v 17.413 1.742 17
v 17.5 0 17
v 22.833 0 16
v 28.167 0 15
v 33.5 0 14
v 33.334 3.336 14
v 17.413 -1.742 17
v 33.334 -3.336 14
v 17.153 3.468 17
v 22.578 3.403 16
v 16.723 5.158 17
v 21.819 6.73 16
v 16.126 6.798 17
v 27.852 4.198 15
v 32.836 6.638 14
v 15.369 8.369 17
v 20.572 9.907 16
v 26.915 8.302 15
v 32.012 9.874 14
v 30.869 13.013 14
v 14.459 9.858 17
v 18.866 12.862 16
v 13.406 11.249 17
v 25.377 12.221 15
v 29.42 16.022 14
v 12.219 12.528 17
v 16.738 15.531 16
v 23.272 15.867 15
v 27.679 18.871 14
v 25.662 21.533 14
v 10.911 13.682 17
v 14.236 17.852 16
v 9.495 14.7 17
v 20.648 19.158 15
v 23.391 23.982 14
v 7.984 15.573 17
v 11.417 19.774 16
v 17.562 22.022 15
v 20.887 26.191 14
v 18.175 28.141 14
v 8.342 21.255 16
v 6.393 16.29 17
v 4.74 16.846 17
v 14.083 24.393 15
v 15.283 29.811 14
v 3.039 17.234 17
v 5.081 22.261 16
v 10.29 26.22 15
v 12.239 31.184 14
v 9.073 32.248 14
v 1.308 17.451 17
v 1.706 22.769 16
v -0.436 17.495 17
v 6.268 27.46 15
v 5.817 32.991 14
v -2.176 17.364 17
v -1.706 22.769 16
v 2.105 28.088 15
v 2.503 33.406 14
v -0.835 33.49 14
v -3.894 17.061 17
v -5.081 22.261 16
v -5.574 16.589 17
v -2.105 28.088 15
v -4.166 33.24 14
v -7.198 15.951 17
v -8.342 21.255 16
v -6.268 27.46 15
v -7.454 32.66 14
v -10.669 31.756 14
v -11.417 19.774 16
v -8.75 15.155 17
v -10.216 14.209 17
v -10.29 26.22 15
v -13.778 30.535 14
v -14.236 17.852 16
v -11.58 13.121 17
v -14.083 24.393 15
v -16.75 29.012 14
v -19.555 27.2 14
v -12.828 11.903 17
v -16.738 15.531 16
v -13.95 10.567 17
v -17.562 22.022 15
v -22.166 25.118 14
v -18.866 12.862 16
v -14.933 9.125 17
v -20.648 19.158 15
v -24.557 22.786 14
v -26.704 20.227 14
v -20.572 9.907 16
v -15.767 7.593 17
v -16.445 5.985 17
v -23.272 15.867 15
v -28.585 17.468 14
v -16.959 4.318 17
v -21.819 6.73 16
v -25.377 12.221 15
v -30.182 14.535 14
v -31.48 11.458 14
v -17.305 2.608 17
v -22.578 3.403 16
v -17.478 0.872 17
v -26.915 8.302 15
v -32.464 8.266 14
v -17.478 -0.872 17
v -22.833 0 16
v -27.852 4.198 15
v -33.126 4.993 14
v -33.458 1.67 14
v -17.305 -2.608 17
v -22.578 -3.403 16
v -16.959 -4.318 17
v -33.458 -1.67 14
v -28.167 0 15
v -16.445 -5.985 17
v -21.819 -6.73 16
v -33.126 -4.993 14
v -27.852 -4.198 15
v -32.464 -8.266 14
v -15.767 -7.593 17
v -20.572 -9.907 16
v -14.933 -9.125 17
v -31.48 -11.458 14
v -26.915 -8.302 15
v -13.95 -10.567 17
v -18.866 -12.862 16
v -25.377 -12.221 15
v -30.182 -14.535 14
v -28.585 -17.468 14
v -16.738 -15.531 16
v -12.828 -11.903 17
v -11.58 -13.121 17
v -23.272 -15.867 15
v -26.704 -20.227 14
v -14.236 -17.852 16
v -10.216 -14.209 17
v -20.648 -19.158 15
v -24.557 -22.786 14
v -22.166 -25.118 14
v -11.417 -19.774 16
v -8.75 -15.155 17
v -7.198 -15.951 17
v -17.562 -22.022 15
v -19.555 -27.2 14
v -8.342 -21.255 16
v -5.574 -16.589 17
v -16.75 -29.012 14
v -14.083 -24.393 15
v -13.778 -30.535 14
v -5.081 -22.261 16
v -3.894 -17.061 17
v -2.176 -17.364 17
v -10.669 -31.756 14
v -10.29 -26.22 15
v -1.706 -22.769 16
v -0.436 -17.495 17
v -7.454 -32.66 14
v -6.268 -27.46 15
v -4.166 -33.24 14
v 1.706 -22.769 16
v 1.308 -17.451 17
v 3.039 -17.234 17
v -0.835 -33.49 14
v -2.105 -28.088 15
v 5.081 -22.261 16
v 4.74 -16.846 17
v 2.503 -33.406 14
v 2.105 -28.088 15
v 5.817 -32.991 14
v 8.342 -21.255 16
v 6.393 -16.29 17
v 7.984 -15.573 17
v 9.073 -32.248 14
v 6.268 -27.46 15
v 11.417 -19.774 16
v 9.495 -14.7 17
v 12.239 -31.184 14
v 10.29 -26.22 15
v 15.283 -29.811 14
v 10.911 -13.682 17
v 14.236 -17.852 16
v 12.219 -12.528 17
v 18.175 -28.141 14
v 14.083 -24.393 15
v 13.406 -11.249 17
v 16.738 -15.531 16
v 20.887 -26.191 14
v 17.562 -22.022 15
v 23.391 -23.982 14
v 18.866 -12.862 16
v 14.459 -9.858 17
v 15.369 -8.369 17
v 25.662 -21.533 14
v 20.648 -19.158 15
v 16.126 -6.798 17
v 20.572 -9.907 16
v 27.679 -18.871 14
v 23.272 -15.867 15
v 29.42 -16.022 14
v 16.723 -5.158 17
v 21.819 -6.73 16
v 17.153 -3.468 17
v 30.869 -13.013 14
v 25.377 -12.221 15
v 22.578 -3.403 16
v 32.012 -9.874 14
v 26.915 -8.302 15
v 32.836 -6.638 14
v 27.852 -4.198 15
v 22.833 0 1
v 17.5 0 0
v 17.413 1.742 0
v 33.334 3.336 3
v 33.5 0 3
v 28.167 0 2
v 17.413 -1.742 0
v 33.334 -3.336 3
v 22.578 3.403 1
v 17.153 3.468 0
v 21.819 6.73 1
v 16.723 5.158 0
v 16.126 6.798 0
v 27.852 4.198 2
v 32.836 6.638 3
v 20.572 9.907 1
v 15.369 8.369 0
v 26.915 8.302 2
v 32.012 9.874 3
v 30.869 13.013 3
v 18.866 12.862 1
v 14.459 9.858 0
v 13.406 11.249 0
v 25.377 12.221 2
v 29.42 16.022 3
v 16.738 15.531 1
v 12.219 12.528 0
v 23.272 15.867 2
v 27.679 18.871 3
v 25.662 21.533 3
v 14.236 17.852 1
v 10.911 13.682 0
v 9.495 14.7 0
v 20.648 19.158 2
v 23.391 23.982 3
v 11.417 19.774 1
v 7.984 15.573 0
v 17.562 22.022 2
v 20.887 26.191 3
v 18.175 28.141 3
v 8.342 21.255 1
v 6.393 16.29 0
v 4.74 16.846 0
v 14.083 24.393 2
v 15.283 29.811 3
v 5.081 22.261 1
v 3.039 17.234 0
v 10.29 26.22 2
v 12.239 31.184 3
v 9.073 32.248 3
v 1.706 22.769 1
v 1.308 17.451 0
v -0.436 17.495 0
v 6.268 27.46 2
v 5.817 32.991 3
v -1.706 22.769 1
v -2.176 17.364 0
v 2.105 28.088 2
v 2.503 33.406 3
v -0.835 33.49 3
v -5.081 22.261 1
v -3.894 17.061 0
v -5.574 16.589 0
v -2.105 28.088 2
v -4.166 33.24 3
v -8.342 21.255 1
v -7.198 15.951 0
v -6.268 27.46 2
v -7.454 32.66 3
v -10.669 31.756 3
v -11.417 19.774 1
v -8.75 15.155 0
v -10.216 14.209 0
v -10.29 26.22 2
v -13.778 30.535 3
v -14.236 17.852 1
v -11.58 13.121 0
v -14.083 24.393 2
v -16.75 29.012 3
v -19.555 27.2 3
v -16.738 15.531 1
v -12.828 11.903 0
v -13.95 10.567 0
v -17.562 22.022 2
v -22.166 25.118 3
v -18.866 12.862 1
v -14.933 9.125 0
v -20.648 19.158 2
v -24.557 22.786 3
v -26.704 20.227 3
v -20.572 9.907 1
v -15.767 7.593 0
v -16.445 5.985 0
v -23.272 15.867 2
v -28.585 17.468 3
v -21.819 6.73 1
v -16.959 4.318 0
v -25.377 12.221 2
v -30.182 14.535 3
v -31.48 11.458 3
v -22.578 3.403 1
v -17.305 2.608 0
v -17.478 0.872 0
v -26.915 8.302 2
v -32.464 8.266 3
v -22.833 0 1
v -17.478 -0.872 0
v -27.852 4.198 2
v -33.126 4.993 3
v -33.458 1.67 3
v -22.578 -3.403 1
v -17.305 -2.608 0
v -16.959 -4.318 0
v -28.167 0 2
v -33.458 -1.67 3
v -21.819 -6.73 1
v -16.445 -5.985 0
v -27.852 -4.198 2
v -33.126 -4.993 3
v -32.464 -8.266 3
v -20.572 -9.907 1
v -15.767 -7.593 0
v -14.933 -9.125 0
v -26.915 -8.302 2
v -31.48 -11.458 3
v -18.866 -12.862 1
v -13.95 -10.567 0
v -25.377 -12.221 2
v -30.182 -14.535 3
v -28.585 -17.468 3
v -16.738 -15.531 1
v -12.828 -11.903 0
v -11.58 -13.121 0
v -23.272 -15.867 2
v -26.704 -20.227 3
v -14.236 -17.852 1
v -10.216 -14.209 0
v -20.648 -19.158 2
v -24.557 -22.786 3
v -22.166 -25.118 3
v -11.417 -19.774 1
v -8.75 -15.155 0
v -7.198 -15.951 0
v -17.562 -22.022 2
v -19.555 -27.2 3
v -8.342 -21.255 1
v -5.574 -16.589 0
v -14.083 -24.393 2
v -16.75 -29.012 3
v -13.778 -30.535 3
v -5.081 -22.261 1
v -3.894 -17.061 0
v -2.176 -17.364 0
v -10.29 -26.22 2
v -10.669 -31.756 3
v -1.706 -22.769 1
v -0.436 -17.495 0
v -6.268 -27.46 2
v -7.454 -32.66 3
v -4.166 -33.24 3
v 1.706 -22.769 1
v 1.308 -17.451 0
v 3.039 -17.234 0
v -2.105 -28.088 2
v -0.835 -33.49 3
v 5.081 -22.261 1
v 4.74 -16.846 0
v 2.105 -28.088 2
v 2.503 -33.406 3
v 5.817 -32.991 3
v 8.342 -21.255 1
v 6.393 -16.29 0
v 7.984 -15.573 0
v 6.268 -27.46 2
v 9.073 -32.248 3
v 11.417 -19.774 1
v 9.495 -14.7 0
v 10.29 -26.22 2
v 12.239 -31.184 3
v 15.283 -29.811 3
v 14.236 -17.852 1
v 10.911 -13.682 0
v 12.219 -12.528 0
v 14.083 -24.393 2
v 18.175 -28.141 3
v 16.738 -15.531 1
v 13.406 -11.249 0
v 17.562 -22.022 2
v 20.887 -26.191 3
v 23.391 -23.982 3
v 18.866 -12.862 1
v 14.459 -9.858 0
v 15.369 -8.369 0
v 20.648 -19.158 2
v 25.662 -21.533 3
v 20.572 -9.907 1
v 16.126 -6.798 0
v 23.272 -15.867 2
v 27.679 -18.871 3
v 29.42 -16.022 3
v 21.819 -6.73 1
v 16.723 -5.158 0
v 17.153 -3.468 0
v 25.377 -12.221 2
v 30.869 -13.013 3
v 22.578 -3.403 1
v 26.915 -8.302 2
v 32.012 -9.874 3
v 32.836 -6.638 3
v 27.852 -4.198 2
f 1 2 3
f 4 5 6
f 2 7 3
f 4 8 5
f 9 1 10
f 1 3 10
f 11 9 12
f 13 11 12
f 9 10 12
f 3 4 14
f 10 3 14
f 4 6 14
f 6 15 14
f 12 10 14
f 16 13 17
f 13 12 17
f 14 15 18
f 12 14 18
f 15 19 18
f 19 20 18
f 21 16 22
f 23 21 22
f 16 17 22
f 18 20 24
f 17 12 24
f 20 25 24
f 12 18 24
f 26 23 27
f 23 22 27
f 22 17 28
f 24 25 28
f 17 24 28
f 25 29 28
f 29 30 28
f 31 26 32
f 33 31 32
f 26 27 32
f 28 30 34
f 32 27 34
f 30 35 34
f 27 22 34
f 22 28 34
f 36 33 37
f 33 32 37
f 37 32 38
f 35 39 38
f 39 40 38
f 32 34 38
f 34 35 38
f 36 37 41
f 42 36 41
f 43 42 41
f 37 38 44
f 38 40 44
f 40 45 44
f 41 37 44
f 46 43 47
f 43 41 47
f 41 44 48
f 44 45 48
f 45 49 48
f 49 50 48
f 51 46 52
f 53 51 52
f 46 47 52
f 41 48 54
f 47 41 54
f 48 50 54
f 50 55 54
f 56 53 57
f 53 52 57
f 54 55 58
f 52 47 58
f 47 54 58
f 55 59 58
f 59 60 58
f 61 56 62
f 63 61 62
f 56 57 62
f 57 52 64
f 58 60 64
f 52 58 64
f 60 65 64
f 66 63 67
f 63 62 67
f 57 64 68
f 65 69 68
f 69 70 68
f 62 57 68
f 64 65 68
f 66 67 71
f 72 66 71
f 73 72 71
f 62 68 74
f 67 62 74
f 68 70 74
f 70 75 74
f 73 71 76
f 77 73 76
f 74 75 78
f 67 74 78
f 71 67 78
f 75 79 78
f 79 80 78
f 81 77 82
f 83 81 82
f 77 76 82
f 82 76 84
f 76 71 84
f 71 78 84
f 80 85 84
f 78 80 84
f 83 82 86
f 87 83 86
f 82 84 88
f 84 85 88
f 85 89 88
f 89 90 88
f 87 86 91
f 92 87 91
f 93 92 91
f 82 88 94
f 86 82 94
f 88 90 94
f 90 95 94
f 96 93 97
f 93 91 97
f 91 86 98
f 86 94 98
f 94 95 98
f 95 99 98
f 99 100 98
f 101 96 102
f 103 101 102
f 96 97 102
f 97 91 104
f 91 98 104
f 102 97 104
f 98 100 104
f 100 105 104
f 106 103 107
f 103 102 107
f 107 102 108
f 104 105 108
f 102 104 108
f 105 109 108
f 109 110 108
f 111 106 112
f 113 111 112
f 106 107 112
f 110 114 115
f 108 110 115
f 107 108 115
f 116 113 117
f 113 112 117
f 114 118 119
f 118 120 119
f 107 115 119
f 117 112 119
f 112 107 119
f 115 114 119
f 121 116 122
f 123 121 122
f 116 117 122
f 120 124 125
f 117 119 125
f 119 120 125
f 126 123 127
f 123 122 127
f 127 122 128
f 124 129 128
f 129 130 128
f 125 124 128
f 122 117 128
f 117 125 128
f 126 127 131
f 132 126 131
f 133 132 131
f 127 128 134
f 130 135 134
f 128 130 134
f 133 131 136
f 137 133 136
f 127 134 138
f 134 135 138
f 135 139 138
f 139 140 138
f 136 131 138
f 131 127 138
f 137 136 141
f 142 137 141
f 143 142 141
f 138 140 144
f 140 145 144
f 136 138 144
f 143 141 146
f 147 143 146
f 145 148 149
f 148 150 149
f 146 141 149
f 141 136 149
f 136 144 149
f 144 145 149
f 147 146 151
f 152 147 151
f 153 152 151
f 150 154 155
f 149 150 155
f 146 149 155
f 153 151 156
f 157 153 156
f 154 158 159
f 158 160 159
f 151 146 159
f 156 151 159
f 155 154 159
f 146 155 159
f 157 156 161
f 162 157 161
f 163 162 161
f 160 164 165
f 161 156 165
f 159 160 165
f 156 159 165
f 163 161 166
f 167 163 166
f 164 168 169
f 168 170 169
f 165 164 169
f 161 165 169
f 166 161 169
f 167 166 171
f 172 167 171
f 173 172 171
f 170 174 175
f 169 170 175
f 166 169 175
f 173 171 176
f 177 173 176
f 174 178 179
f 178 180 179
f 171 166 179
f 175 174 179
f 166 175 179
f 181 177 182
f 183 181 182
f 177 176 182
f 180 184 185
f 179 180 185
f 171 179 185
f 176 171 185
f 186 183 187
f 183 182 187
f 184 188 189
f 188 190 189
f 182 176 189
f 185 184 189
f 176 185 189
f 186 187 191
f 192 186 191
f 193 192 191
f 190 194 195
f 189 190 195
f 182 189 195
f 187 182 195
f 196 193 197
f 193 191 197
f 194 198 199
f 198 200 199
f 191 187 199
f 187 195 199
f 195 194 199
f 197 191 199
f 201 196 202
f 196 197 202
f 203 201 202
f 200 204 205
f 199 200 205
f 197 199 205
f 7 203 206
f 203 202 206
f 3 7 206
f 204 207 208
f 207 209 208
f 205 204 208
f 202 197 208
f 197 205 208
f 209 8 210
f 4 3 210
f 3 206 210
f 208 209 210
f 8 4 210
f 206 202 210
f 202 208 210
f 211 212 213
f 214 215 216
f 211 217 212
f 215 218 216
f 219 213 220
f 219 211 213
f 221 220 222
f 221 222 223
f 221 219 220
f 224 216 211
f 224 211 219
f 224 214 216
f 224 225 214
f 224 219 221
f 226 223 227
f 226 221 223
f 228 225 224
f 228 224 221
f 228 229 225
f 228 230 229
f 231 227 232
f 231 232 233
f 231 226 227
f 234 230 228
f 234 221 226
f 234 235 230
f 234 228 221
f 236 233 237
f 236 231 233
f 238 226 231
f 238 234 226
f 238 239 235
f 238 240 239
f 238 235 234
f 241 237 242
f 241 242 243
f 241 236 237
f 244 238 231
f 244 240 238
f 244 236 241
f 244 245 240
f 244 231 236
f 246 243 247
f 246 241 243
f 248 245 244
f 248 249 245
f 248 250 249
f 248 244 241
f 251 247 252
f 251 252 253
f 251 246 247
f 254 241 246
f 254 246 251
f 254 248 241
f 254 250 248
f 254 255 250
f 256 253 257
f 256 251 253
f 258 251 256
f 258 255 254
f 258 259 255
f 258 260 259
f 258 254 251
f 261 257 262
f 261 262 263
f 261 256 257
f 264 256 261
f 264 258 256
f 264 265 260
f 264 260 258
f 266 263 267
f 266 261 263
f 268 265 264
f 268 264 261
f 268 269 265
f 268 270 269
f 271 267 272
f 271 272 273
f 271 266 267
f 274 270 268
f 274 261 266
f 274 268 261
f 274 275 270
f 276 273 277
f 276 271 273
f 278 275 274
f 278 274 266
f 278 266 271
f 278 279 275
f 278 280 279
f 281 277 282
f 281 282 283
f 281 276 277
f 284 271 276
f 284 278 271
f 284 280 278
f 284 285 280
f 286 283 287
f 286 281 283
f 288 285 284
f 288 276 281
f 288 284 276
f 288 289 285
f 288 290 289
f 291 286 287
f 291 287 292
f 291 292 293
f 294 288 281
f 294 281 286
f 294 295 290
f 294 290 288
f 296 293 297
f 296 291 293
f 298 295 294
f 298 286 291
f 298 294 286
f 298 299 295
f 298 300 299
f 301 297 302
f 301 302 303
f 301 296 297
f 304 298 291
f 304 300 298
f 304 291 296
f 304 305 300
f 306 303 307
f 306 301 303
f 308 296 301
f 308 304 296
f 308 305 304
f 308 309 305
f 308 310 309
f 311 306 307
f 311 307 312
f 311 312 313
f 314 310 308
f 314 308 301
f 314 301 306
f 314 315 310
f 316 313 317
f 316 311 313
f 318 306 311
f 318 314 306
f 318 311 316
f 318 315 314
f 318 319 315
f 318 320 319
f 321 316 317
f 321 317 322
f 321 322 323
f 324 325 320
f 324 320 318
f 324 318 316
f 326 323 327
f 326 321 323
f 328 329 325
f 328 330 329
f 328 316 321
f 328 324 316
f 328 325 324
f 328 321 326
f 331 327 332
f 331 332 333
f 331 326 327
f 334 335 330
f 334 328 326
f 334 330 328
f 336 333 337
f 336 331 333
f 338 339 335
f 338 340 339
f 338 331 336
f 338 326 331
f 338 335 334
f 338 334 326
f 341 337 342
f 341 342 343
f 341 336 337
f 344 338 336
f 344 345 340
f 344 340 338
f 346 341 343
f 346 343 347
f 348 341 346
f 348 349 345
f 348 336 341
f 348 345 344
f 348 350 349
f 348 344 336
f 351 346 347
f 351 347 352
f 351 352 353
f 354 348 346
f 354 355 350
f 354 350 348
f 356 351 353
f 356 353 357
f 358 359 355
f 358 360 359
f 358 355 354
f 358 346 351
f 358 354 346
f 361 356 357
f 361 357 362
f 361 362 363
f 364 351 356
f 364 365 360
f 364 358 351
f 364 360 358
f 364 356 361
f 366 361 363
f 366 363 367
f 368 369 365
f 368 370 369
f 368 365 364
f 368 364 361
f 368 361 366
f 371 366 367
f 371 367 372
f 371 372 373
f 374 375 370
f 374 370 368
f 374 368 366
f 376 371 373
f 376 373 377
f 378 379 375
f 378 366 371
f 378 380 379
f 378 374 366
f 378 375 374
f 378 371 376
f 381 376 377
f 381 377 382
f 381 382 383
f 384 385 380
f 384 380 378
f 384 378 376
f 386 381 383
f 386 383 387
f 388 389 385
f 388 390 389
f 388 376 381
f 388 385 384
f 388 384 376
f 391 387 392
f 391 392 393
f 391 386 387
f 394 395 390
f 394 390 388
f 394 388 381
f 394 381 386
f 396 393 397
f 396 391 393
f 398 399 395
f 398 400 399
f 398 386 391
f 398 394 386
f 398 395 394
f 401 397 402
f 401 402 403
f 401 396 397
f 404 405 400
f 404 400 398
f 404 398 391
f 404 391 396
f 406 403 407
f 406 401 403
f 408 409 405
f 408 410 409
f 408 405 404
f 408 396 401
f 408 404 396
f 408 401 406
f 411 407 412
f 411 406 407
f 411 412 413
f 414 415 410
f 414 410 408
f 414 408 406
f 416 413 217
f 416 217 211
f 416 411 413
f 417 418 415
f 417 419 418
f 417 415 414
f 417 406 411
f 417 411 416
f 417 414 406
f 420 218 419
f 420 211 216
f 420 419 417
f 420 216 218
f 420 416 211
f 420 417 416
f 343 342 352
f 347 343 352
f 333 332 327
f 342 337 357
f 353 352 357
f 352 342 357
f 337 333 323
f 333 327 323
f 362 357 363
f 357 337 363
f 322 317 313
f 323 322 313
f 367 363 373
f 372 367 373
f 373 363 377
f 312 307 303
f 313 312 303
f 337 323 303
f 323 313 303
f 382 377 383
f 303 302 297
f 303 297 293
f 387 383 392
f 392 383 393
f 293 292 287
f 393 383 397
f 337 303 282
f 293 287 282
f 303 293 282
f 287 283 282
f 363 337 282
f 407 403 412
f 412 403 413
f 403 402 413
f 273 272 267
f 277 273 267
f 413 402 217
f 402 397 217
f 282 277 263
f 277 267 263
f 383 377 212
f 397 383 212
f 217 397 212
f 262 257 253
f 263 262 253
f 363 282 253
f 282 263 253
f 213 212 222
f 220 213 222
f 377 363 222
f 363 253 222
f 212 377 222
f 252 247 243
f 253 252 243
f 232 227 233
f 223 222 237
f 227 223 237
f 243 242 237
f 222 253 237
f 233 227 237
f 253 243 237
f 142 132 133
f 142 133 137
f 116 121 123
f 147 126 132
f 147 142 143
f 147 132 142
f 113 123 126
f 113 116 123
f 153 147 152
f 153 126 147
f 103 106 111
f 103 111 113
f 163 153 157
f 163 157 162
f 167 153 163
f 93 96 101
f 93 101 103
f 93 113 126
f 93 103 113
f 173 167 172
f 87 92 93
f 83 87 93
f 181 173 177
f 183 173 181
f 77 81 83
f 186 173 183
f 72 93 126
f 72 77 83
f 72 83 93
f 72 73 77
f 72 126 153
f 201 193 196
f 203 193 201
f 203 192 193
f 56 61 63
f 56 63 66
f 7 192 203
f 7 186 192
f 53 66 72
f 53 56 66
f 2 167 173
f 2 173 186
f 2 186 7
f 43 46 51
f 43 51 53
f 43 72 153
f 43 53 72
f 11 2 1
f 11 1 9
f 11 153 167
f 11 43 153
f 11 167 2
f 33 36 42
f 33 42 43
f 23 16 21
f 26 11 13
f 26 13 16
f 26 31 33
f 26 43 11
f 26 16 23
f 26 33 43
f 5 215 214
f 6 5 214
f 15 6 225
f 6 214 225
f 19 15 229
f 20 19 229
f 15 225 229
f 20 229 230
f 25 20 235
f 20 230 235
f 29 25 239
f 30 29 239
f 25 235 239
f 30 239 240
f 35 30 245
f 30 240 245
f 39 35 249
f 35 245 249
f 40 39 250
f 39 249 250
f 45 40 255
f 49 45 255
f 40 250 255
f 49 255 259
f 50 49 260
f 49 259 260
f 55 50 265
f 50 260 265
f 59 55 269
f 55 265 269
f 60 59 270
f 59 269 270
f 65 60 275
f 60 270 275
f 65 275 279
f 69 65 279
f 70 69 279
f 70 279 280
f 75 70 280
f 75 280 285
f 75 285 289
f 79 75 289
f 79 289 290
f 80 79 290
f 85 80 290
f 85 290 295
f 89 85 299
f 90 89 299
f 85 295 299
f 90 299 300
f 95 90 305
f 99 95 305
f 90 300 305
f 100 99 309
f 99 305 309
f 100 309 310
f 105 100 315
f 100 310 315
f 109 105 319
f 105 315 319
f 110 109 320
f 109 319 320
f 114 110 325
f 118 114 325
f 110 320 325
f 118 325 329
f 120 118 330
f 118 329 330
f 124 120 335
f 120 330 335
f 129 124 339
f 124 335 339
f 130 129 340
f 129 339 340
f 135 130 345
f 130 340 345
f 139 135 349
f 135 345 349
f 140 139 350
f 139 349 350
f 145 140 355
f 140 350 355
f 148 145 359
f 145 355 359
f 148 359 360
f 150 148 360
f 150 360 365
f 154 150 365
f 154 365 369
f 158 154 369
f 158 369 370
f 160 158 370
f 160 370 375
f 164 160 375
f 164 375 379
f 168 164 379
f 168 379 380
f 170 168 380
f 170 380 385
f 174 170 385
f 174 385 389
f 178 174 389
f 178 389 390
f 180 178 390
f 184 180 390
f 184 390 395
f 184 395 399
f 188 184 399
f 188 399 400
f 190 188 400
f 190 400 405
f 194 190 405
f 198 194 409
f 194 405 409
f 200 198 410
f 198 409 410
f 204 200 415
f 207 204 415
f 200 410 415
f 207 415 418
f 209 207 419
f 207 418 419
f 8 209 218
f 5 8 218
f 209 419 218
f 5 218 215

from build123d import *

# Parameters (mm, degrees)
F0_R       = 33.5
F1_DEPTH   = 17
F2_SIZE2   = 3
F2_SIZE    = 16
F2_2_SIZE2 = 3
F2_2_SIZE  = 16


with BuildPart() as f1:
    # F0 (on Top) → F1 (new body)
    with BuildSketch(Plane.XY):
        Circle(F0_R)
    extrude(amount=F1_DEPTH)

    # F2
    f2_edges = [f1.edges().sort_by_distance(p)[0] for p in [
        (-33.5, 0, 17),
    ]]
    f2_side = f1.faces().sort_by_distance((0, 0, 17))[0]
    chamfer(f2_edges, length=F2_SIZE, length2=F2_SIZE2, reference=f2_side)

    # F2#2
    f2_2_edges = [f1.edges().sort_by_distance(p)[0] for p in [
        (-33.5, 0, 0),
    ]]
    f2_2_side = f1.faces().sort_by_distance((0, 0, 0))[0]
    chamfer(f2_2_edges, length=F2_2_SIZE, length2=F2_2_SIZE2, reference=f2_2_side)


solid = f1.part
